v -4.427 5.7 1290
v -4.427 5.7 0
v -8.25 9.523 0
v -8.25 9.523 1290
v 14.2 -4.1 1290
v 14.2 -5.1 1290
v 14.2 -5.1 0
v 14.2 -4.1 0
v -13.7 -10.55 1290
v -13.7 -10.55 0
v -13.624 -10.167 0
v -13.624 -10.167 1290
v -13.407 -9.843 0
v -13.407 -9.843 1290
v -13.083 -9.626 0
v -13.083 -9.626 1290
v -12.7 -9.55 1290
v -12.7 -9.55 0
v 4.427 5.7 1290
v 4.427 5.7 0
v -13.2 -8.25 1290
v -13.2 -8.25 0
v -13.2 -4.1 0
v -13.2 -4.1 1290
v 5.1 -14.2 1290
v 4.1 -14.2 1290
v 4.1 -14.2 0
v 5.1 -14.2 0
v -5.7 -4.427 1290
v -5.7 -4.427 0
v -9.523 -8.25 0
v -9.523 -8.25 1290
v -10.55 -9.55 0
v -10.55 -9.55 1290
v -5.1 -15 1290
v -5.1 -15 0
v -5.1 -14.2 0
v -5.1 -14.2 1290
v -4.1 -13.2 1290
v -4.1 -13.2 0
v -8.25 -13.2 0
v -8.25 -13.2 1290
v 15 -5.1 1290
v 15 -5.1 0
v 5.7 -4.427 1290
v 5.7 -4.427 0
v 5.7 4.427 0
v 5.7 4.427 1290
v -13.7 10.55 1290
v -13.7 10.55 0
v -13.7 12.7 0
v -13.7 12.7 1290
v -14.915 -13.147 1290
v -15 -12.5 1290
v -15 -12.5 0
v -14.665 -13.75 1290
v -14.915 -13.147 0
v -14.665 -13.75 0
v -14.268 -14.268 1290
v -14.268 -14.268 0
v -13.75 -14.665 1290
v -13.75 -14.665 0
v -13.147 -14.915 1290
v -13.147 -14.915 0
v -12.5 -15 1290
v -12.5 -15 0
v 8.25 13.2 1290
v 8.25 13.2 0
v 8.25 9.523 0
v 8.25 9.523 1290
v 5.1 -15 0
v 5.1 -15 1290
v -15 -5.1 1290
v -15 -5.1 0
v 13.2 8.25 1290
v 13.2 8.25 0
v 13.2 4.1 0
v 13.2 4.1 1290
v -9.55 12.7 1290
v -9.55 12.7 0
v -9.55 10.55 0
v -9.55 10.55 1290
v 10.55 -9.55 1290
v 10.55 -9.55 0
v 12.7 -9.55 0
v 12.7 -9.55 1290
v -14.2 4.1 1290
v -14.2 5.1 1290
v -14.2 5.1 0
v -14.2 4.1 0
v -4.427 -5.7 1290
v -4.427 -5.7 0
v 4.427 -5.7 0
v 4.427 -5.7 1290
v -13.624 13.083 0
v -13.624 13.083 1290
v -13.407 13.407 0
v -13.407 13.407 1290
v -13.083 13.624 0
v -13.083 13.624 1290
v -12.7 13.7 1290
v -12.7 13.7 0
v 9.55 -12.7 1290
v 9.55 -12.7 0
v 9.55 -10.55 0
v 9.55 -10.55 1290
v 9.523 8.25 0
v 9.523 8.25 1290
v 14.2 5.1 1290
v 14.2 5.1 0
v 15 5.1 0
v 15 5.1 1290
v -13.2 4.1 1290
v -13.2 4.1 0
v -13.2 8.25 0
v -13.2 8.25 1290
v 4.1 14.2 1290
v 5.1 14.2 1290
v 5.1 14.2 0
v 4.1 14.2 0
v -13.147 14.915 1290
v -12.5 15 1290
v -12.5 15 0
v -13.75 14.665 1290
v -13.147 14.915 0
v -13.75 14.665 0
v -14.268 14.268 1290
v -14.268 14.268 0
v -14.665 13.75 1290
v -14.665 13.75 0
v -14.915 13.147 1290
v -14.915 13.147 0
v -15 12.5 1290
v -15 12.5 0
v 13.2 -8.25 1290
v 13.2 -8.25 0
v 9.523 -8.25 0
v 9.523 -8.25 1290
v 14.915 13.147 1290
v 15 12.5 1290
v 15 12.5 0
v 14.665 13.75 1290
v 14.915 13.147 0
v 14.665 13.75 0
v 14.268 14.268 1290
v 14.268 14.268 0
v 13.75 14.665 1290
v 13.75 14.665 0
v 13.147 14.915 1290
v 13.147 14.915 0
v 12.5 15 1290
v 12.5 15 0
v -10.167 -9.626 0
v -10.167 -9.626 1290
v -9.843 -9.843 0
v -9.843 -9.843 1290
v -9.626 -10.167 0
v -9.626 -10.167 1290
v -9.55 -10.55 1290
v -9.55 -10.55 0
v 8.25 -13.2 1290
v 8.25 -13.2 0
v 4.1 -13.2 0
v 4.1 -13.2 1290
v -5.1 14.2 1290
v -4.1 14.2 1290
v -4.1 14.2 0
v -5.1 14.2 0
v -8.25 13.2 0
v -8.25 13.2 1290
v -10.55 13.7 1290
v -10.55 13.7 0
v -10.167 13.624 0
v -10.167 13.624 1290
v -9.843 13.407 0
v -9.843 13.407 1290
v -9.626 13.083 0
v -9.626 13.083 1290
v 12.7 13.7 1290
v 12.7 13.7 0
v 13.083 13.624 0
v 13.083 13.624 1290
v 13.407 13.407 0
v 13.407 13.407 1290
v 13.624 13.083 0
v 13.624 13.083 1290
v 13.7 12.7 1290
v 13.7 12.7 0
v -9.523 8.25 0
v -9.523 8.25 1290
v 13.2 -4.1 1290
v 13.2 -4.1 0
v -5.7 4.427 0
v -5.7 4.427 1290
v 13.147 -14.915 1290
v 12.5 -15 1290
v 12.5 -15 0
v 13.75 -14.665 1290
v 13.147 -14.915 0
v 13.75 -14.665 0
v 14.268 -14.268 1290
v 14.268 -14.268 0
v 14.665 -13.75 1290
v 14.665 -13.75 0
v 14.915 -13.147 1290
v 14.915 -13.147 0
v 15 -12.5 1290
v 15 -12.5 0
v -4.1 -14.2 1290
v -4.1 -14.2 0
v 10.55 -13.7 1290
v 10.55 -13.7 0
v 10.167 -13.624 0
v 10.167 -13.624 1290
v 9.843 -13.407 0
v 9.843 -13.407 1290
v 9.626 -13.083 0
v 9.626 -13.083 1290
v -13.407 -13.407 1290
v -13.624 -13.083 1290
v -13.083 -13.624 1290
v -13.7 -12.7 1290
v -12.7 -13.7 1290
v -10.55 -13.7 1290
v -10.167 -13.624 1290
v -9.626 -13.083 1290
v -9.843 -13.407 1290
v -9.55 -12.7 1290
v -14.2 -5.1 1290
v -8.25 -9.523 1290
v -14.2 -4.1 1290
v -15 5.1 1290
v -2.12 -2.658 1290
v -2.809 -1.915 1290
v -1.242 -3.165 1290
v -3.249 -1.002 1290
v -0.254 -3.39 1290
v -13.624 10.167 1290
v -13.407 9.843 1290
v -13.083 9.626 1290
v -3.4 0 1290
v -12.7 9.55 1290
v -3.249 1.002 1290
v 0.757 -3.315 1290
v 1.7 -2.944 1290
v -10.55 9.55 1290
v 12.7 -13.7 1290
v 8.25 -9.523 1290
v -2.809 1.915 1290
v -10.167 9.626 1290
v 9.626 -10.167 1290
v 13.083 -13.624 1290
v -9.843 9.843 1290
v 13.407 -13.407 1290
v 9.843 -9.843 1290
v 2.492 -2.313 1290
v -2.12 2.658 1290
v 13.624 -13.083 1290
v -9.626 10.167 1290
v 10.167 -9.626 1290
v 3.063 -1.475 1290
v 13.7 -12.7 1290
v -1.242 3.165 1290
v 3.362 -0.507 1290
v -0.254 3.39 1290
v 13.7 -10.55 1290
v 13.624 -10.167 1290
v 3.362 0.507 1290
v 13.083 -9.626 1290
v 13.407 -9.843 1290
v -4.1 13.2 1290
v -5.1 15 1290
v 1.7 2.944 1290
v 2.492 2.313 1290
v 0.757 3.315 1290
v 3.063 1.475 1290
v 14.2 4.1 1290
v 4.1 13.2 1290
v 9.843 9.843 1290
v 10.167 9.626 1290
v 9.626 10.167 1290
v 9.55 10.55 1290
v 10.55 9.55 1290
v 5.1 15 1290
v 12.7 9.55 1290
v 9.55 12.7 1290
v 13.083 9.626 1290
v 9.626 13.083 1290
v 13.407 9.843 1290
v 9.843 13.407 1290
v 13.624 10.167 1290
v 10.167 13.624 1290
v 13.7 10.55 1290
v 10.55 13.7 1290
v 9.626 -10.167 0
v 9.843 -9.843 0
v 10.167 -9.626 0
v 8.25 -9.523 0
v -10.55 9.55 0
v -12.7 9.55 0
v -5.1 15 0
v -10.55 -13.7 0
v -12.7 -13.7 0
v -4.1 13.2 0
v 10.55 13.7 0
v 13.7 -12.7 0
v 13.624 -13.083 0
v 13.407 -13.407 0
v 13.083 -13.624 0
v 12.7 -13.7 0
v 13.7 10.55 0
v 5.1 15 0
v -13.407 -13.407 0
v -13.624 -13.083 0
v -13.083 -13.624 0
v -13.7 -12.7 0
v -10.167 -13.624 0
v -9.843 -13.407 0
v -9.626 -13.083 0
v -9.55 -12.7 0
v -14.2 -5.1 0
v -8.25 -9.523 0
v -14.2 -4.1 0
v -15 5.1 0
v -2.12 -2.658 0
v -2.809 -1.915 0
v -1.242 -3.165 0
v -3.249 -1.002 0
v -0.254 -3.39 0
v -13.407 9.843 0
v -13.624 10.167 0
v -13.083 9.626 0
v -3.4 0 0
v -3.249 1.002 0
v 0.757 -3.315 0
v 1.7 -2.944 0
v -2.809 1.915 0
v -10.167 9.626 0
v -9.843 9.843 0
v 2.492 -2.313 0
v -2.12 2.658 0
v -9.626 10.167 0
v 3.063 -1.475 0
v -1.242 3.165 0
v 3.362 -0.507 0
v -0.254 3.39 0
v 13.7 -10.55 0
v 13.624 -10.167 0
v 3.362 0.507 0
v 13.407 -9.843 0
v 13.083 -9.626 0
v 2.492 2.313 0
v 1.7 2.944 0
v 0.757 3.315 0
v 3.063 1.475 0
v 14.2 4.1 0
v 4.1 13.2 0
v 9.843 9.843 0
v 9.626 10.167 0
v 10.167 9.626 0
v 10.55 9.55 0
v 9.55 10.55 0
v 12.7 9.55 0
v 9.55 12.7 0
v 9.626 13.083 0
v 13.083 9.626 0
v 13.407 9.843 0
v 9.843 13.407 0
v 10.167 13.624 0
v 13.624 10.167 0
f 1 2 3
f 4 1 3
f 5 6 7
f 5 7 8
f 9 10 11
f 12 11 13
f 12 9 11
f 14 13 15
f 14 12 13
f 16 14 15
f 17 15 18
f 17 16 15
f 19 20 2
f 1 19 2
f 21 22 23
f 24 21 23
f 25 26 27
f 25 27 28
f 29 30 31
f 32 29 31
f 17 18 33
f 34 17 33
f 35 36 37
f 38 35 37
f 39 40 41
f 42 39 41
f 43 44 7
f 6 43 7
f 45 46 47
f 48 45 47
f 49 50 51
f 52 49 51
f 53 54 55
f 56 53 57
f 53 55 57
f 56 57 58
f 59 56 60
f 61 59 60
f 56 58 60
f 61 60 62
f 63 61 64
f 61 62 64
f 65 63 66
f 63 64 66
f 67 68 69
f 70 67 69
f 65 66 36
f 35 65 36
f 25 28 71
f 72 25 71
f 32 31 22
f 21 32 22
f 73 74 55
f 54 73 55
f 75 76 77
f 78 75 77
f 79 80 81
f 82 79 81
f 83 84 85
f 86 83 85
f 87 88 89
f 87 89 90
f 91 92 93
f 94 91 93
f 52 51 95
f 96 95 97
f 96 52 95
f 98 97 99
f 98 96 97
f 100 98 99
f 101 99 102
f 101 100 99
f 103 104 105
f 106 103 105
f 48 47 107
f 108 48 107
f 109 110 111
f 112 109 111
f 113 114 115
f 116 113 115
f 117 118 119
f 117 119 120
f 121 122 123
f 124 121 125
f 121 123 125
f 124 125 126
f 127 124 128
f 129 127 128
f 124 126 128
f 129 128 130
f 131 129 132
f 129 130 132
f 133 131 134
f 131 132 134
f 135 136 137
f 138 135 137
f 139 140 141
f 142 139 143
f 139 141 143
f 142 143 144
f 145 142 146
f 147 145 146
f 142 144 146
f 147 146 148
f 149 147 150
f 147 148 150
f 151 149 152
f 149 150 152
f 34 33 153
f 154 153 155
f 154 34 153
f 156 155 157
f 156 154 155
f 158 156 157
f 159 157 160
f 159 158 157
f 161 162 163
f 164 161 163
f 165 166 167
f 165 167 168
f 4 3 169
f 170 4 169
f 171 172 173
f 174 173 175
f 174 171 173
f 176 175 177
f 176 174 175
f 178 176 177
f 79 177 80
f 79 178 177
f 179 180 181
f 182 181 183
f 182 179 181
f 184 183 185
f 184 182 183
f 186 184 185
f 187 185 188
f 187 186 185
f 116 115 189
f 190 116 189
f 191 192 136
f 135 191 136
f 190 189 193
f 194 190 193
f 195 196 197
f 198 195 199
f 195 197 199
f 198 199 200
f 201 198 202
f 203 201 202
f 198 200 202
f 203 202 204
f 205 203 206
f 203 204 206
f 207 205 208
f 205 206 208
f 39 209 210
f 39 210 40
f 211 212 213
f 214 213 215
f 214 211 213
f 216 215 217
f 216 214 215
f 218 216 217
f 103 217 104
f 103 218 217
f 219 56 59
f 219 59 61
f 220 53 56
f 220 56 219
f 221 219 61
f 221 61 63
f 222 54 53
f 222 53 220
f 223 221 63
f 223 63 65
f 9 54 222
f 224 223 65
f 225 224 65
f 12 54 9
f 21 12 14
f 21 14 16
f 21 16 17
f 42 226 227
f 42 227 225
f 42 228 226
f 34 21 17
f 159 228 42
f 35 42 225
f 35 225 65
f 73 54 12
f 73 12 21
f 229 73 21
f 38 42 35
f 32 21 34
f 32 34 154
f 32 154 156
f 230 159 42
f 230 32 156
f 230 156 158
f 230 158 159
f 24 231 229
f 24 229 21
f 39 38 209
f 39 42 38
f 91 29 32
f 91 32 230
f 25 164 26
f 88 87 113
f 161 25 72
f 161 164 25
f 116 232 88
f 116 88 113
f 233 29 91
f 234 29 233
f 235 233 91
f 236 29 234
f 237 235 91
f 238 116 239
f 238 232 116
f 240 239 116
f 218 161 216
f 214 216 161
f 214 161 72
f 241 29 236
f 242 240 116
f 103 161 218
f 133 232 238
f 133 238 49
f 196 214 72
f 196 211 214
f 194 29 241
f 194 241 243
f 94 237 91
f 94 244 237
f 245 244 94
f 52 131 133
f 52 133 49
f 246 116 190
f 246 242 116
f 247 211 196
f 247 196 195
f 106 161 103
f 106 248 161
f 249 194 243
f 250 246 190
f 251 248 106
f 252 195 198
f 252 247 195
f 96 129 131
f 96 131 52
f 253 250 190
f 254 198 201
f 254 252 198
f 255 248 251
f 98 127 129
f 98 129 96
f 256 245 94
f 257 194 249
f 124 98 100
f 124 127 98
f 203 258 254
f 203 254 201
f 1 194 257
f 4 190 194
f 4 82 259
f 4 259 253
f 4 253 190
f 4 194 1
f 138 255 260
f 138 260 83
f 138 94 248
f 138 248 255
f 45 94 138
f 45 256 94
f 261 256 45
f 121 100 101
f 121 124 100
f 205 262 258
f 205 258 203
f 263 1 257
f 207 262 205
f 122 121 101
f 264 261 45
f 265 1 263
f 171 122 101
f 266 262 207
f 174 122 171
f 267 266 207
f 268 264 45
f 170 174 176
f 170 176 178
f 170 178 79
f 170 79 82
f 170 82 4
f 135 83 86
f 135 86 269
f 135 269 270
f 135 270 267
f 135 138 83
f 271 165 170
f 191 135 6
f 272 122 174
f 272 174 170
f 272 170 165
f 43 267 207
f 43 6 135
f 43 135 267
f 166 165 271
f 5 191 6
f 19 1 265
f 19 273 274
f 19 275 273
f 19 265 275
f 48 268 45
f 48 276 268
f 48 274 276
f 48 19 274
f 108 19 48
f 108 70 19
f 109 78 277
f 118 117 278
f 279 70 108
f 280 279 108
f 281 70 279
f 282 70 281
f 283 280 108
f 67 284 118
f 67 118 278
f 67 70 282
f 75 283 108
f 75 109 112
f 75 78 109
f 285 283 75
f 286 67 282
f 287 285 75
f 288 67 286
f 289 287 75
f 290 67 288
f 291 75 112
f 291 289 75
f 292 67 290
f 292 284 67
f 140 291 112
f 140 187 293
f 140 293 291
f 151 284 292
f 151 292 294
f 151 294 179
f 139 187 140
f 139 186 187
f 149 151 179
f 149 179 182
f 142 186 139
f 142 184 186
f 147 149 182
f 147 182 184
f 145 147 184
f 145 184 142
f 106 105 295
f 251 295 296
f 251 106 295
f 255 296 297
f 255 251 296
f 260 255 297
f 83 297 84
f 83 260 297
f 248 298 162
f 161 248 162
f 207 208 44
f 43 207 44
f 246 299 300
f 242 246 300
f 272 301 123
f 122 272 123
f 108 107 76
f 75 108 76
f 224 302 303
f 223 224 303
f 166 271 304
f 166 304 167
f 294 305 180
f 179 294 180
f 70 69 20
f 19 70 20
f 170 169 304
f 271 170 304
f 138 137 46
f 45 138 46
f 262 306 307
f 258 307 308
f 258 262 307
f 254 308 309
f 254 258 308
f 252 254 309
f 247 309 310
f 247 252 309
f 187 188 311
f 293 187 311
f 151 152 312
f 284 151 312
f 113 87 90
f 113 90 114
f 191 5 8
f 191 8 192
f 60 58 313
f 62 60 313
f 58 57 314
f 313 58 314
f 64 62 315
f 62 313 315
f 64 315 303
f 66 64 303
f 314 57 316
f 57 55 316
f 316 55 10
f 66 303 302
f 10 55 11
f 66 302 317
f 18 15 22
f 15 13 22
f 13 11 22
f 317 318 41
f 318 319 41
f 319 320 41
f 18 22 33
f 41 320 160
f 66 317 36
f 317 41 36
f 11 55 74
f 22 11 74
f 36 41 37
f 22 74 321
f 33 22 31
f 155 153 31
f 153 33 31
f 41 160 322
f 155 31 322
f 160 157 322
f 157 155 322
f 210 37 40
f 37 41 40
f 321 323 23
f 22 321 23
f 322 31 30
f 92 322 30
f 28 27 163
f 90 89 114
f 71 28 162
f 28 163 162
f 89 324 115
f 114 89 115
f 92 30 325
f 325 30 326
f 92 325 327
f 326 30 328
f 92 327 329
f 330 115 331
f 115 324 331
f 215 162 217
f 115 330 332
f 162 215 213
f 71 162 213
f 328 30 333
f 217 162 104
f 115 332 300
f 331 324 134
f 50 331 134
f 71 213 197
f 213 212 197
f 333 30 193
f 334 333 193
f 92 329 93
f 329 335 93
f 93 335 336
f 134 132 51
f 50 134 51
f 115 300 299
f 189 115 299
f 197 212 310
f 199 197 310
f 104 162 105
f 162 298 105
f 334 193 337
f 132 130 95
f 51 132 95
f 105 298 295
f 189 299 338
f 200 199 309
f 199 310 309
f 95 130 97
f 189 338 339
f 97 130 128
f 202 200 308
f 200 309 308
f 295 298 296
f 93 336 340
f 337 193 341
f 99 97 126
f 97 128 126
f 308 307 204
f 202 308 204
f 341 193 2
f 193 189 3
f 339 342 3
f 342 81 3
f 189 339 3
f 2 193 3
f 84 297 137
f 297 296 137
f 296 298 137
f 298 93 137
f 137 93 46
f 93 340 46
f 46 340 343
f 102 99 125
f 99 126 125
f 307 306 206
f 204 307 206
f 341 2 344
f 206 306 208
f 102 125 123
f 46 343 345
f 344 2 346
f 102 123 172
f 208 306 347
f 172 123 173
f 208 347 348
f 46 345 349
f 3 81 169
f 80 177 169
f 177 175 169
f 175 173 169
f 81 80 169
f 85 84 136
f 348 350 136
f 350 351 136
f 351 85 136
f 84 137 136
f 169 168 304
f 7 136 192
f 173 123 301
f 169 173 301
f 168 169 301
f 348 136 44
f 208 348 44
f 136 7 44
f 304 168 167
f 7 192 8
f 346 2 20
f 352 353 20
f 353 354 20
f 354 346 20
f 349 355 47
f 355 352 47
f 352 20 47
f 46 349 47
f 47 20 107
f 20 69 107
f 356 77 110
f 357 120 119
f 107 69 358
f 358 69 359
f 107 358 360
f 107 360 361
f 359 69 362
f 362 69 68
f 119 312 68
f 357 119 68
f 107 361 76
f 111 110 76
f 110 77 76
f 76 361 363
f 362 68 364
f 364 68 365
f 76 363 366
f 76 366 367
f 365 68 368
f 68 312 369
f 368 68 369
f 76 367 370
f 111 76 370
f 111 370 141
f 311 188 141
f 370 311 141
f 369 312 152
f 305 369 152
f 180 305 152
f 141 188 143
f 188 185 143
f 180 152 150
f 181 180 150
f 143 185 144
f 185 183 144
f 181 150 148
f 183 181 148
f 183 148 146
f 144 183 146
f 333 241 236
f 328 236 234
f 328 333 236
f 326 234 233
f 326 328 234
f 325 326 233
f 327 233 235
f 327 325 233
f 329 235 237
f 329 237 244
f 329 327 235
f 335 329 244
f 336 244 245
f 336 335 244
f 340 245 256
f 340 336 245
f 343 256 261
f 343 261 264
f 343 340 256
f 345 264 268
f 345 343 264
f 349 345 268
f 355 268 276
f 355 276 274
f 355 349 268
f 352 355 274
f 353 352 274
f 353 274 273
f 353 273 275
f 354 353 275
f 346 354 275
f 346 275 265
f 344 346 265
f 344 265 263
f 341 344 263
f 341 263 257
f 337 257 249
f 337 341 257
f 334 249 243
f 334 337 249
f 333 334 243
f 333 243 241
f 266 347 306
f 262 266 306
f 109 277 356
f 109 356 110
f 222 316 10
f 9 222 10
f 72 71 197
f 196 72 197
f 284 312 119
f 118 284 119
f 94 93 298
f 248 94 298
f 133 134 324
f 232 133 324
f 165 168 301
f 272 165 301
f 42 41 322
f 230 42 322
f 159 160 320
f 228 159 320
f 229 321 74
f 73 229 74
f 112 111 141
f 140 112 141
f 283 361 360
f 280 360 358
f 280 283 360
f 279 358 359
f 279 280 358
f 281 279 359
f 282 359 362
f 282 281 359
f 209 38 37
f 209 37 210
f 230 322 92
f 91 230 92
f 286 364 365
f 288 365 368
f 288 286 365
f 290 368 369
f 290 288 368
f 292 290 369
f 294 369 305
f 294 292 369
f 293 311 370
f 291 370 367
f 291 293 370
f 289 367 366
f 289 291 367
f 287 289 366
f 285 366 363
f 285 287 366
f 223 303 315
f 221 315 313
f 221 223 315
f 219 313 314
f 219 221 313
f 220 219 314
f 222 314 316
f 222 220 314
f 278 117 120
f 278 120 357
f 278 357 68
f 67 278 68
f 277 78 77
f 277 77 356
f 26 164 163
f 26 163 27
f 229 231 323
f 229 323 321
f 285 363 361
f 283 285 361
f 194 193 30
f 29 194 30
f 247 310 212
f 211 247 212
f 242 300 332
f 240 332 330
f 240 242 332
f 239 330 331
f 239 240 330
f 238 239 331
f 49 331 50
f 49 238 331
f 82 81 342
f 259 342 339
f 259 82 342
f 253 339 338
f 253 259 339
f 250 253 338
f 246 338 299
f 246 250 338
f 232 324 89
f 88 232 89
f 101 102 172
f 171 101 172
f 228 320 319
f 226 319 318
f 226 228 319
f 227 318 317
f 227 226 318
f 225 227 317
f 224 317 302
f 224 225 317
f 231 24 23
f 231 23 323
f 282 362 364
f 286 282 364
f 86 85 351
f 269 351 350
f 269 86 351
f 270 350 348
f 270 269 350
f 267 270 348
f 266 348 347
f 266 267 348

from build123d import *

# Parameters (mm, degrees)
SKETCH1_R      = 3.4
EXTRUDE1_DEPTH = 1290
EXTRUDE2_DEPTH = 1291.174406815


with BuildPart() as part:
    # Sketch1 → Extrude1 (new body)
    with BuildSketch(Plane.XY):
        with BuildLine():
            Line((-5.1, 14.2), (-5.1, 15))
            Line((-5.1, 15), (-12.5, 15))
            ThreePointArc((-12.5, 15), (-14.267766953, 14.267766953), (-15, 12.5))
            Line((-15, 12.5), (-15, 5.1))
            Line((-15, 5.1), (-14.2, 5.1))
            Line((-14.2, 5.1), (-14.2, 4.1))
            Line((-14.2, 4.1), (-13.2, 4.1))
            Line((-13.2, 4.1), (-13.2, 8.25))
            Line((-13.2, 8.25), (-9.522792206, 8.25))
            Line((-9.522792206, 8.25), (-5.7, 4.427207794))
            Line((-5.7, 4.427207794), (-5.7, -4.427207794))
            Line((-5.7, -4.427207794), (-9.522792206, -8.25))
            Line((-9.522792206, -8.25), (-13.2, -8.25))
            Line((-13.2, -8.25), (-13.2, -4.1))
            Line((-13.2, -4.1), (-14.2, -4.1))
            Line((-14.2, -4.1), (-14.2, -5.1))
            Line((-14.2, -5.1), (-15, -5.1))
            Line((-15, -5.1), (-15, -12.5))
            ThreePointArc((-15, -12.5), (-14.267766953, -14.267766953), (-12.5, -15))
            Line((-12.5, -15), (-5.1, -15))
            Line((-5.1, -15), (-5.1, -14.2))
            Line((-5.1, -14.2), (-4.1, -14.2))
            Line((-4.1, -14.2), (-4.1, -13.2))
            Line((-4.1, -13.2), (-8.25, -13.2))
            Line((-8.25, -13.2), (-8.25, -9.522792206))
            Line((-8.25, -9.522792206), (-4.427207794, -5.7))
            Line((-4.427207794, -5.7), (4.427207794, -5.7))
            Line((4.427207794, -5.7), (8.25, -9.522792206))
            Line((8.25, -9.522792206), (8.25, -13.2))
            Line((8.25, -13.2), (4.1, -13.2))
            Line((4.1, -13.2), (4.1, -14.2))
            Line((4.1, -14.2), (5.1, -14.2))
            Line((5.1, -14.2), (5.1, -15))
            Line((5.1, -15), (12.5, -15))
            ThreePointArc((12.5, -15), (14.267766953, -14.267766953), (15, -12.5))
            Line((15, -12.5), (15, -5.1))
            Line((15, -5.1), (14.2, -5.1))
            Line((14.2, -5.1), (14.2, -4.1))
            Line((14.2, -4.1), (13.2, -4.1))
            Line((13.2, -4.1), (13.2, -8.25))
            Line((13.2, -8.25), (9.522792206, -8.25))
            Line((9.522792206, -8.25), (5.7, -4.427207794))
            Line((5.7, -4.427207794), (5.7, 4.427207794))
            Line((5.7, 4.427207794), (9.522792206, 8.25))
            Line((9.522792206, 8.25), (13.2, 8.25))
            Line((13.2, 8.25), (13.2, 4.1))
            Line((13.2, 4.1), (14.2, 4.1))
            Line((14.2, 4.1), (14.2, 5.1))
            Line((14.2, 5.1), (15, 5.1))
            Line((15, 5.1), (15, 12.5))
            ThreePointArc((15, 12.5), (14.267766953, 14.267766953), (12.5, 15))
            Line((12.5, 15), (5.1, 15))
            Line((5.1, 15), (5.1, 14.2))
            Line((5.1, 14.2), (4.1, 14.2))
            Line((4.1, 14.2), (4.1, 13.2))
            Line((4.1, 13.2), (8.25, 13.2))
            Line((8.25, 13.2), (8.25, 9.522792206))
            Line((8.25, 9.522792206), (4.427207794, 5.7))
            Line((4.427207794, 5.7), (-4.427207794, 5.7))
            Line((-4.427207794, 5.7), (-8.25, 9.522792206))
            Line((-8.25, 9.522792206), (-8.25, 13.2))
            Line((-8.25, 13.2), (-4.1, 13.2))
            Line((-4.1, 13.2), (-4.1, 14.2))
            Line((-4.1, 14.2), (-5.1, 14.2))
        make_face()
        with Locations(Location((0, 0, 0), (0, 0, 180))):
            Circle(SKETCH1_R, mode=Mode.SUBTRACT)
    extrude(amount=EXTRUDE1_DEPTH)

    # Sketch2 → Extrude2 (cut, through all)
    with BuildSketch(Plane.XY.offset(1290)):
        with BuildLine():
            Line((13.7, 12.7), (13.7, 10.55))
            ThreePointArc((13.7, 10.55), (13.407106781, 9.842893219), (12.7, 9.55))
            Line((12.7, 9.55), (10.55, 9.55))
            ThreePointArc((10.55, 9.55), (9.842893219, 9.842893219), (9.55, 10.55))
            Line((9.55, 10.55), (9.55, 12.7))
            ThreePointArc((9.55, 12.7), (9.842893219, 13.407106781), (10.55, 13.7))
            Line((10.55, 13.7), (12.7, 13.7))
            ThreePointArc((12.7, 13.7), (13.407106781, 13.407106781), (13.7, 12.7))
        make_face()
        with BuildLine():
            Line((-12.7, 13.7), (-10.55, 13.7))
            ThreePointArc((-10.55, 13.7), (-9.842893219, 13.407106781), (-9.55, 12.7))
            Line((-9.55, 12.7), (-9.55, 10.55))
            ThreePointArc((-9.55, 10.55), (-9.842893219, 9.842893219), (-10.55, 9.55))
            Line((-10.55, 9.55), (-12.7, 9.55))
            ThreePointArc((-12.7, 9.55), (-13.407106781, 9.842893219), (-13.7, 10.55))
            Line((-13.7, 10.55), (-13.7, 12.7))
            ThreePointArc((-13.7, 12.7), (-13.407106781, 13.407106781), (-12.7, 13.7))
        make_face()
        with BuildLine():
            Line((12.7, -13.7), (10.55, -13.7))
            ThreePointArc((10.55, -13.7), (9.842893219, -13.407106781), (9.55, -12.7))
            Line((9.55, -12.7), (9.55, -10.55))
            ThreePointArc((9.55, -10.55), (9.842893219, -9.842893219), (10.55, -9.55))
            Line((10.55, -9.55), (12.7, -9.55))
            ThreePointArc((12.7, -9.55), (13.407106781, -9.842893219), (13.7, -10.55))
            Line((13.7, -10.55), (13.7, -12.7))
            ThreePointArc((13.7, -12.7), (13.407106781, -13.407106781), (12.7, -13.7))
        make_face()
        with BuildLine():
            Line((-13.7, -12.7), (-13.7, -10.55))
            ThreePointArc((-13.7, -10.55), (-13.407106781, -9.842893219), (-12.7, -9.55))
            Line((-12.7, -9.55), (-10.55, -9.55))
            ThreePointArc((-10.55, -9.55), (-9.842893219, -9.842893219), (-9.55, -10.55))
            Line((-9.55, -10.55), (-9.55, -12.7))
            ThreePointArc((-9.55, -12.7), (-9.842893219, -13.407106781), (-10.55, -13.7))
            Line((-10.55, -13.7), (-12.7, -13.7))
            ThreePointArc((-12.7, -13.7), (-13.407106781, -13.407106781), (-13.7, -12.7))
        make_face()
    extrude(amount=-EXTRUDE2_DEPTH, mode=Mode.SUBTRACT)


solid = part.part
